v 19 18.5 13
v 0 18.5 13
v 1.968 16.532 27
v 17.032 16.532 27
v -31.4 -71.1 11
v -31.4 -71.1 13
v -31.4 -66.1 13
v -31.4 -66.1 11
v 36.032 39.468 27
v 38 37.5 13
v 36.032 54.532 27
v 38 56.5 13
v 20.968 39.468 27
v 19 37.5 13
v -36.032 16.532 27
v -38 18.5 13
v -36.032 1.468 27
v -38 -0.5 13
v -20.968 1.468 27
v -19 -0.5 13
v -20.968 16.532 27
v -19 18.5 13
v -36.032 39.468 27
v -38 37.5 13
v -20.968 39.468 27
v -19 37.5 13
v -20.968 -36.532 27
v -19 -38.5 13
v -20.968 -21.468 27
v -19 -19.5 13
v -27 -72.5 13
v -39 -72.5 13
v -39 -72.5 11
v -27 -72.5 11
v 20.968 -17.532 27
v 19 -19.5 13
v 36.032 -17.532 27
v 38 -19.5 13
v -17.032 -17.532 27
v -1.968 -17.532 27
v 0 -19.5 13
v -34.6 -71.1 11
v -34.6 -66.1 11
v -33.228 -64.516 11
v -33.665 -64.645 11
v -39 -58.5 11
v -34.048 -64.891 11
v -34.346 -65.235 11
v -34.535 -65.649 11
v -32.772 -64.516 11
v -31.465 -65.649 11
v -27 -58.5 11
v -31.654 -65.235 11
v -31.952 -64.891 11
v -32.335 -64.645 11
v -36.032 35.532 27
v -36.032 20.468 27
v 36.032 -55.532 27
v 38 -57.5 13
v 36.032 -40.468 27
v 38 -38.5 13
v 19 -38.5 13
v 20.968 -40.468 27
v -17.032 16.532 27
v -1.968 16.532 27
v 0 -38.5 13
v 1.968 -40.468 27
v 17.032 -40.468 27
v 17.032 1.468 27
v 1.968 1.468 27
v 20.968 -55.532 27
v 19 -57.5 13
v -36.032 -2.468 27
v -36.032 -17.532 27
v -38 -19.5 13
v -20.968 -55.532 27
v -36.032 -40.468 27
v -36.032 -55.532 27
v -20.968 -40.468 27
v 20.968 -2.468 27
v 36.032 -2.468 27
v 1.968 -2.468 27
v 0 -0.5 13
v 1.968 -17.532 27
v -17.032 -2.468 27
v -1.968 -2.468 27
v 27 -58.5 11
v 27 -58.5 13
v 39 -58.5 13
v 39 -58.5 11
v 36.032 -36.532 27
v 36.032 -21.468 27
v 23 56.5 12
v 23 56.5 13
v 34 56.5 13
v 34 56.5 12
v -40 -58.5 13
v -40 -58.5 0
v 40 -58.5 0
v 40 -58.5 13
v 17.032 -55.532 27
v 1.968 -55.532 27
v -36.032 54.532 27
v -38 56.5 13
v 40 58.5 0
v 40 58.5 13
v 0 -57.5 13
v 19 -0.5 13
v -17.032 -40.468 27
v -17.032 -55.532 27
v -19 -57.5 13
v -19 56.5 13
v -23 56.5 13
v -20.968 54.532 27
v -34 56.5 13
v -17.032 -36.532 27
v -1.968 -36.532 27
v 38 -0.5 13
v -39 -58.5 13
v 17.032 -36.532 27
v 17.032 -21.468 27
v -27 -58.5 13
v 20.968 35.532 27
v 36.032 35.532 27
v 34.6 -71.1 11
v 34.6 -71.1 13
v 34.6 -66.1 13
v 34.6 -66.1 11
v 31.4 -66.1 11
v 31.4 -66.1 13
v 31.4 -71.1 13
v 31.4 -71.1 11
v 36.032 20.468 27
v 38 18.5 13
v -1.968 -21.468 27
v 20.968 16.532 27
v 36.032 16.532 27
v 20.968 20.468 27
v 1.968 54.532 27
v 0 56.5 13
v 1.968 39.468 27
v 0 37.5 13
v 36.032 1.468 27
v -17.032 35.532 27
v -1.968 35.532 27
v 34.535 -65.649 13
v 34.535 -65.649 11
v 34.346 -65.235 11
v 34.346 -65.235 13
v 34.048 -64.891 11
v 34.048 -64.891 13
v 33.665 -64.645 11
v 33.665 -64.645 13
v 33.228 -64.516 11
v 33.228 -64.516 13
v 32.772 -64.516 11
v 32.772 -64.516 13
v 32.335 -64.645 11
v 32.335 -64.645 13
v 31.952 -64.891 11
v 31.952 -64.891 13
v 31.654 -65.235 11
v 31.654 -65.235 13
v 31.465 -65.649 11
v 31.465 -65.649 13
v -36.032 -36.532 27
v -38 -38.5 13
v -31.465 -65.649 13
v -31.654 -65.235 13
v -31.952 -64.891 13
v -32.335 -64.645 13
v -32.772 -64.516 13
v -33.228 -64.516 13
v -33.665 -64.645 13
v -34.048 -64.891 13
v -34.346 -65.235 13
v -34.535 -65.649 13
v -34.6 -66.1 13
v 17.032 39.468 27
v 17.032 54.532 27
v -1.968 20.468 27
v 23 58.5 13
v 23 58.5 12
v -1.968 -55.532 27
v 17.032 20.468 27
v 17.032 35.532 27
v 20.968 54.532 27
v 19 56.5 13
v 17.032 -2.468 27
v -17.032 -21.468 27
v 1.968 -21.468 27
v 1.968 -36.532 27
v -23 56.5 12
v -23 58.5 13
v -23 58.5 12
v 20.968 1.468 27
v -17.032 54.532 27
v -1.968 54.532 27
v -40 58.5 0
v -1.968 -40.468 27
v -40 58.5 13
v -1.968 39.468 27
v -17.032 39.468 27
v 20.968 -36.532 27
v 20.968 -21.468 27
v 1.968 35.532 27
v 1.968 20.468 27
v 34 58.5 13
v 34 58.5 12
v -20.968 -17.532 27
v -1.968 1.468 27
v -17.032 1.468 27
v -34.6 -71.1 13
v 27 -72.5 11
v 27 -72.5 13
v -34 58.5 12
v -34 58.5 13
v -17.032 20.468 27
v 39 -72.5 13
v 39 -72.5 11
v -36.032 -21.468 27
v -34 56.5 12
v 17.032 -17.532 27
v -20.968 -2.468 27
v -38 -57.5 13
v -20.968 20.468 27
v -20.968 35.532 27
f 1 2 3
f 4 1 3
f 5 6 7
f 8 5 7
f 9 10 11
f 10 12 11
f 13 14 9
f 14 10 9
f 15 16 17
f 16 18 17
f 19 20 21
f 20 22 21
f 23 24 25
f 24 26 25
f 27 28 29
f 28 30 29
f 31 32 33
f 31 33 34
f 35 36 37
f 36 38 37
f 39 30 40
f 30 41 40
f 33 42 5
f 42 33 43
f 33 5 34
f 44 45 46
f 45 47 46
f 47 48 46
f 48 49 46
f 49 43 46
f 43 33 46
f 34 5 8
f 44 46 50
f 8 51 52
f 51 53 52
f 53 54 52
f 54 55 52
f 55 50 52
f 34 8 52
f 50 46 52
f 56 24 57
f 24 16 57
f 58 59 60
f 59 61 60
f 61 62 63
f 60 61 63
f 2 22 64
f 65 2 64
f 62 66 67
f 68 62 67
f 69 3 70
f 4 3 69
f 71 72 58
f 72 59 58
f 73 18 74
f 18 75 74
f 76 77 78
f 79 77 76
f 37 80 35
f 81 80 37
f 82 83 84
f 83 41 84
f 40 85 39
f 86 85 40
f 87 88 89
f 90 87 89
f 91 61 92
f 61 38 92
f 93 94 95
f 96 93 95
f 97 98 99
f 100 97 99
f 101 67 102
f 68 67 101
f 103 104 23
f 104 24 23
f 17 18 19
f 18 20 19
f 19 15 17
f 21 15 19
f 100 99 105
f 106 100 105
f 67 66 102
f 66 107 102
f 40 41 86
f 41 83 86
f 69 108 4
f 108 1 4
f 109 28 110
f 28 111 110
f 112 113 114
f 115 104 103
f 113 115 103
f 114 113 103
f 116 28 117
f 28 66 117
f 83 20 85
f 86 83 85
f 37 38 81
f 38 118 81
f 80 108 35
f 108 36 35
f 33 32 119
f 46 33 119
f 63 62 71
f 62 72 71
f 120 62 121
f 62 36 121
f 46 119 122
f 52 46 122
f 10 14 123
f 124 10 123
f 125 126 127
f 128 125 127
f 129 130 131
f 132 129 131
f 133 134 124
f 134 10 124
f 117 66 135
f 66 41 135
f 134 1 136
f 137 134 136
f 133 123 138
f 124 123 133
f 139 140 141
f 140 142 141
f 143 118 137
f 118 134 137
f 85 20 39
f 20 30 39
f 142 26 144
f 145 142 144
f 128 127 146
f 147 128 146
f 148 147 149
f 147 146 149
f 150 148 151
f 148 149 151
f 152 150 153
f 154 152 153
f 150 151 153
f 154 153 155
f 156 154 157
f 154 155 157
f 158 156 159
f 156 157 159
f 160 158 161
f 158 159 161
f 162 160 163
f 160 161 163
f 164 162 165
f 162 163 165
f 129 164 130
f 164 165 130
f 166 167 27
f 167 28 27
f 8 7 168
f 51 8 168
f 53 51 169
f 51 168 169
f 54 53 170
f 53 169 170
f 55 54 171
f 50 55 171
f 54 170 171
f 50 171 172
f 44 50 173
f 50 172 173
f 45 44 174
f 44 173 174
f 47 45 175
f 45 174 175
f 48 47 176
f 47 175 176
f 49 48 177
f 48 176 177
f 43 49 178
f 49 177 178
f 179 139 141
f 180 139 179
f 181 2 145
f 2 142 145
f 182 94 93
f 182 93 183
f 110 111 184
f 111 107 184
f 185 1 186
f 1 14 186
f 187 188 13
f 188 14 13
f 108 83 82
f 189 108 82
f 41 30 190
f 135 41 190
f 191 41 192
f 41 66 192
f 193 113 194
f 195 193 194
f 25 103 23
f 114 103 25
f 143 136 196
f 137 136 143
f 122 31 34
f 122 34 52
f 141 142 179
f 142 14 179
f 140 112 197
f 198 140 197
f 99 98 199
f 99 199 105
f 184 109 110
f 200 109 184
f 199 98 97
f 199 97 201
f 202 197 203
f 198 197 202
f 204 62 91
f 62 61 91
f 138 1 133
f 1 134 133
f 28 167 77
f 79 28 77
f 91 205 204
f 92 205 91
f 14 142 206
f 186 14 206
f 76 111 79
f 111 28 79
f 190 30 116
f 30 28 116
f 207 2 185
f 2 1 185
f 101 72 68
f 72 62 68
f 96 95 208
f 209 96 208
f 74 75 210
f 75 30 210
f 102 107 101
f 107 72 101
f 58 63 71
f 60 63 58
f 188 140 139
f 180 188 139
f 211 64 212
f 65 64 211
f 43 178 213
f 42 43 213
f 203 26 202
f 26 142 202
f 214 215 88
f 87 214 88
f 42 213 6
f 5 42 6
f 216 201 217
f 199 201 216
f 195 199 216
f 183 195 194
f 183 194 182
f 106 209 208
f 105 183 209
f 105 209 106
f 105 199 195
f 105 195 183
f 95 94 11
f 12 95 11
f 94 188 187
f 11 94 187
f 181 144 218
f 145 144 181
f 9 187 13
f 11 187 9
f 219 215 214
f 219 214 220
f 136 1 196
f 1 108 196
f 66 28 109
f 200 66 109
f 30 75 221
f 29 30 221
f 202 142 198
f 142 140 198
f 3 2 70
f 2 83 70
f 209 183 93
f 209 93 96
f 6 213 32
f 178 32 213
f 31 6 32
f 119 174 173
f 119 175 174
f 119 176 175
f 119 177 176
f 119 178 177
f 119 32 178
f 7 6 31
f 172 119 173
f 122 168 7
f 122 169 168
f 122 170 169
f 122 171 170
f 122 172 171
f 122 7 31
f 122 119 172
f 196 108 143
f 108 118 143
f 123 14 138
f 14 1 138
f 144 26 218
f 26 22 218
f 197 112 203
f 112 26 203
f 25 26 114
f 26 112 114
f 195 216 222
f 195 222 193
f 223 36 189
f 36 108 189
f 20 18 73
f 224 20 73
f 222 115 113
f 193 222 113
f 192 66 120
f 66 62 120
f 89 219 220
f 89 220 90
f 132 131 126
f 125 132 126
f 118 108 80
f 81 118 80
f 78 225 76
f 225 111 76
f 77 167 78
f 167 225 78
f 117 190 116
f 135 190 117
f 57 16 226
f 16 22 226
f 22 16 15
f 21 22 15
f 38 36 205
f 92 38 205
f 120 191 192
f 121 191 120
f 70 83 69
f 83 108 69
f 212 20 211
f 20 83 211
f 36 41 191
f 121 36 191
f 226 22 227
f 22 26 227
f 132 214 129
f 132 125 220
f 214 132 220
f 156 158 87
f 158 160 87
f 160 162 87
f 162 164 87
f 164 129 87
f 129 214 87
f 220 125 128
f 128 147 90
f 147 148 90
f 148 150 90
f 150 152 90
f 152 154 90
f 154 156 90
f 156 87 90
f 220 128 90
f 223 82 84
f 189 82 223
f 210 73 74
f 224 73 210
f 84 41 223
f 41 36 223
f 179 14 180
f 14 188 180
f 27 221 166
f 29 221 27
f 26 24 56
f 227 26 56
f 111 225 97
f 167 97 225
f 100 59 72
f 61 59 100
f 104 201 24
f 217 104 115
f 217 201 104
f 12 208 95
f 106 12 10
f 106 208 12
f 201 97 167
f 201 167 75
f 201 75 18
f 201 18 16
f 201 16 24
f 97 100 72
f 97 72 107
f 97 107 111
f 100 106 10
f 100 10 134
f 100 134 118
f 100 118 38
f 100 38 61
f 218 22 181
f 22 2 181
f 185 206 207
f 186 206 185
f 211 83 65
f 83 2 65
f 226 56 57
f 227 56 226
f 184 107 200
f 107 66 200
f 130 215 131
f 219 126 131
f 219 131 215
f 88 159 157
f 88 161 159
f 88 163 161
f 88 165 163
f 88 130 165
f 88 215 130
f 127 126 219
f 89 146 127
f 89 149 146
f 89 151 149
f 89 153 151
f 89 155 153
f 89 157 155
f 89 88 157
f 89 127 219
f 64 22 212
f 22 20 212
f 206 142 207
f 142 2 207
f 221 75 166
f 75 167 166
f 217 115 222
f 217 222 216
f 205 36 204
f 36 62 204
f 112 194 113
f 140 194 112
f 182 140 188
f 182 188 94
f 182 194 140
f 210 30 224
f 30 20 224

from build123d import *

# Parameters (mm, degrees)
SKETCH_1_W                  = 80
SKETCH_1_H                  = 117
EXTRUDE_1_DEPTH             = 13
SKETCH_2_W                  = 19
SKETCH_2_H                  = 19
EXTRUDE_2_DEPTH             = 14
EXTRUDE_2_TAPER             = 8
PATTERN_LINEAR_1_COUNT      = 4
PATTERN_LINEAR_1_PITCH      = 19
PATTERN_LINEAR_1_COUNT_DIR2 = 6
PATTERN_LINEAR_1_PITCH_DIR2 = 19
SKETCH_4_W                  = 12
SKETCH_4_H                  = 14
EXTRUDE_3_DEPTH             = 2
EXTRUDE_3_2_DEPTH           = 2
SKETCH_3_W                  = 11
SKETCH_3_H                  = 2
CUT_EXTRUDE_1_DEPTH         = 1


with BuildPart() as part:
    # Эскиз1 → Бобышка-Вытянуть1 (new body)
    with BuildSketch(Plane.XY):
        Rectangle(SKETCH_1_W, SKETCH_1_H)
    extrude(amount=EXTRUDE_1_DEPTH)

    # Эскиз2 → Бобышка-Вытянуть2 (add)
    with BuildSketch(Plane.XY.offset(13)):
        with Locations((-28.5, 47)):
            Rectangle(SKETCH_2_W, SKETCH_2_H)
    extrude_2 = extrude(amount=EXTRUDE_2_DEPTH, taper=EXTRUDE_2_TAPER)

    # Линейный массив1: Extrude 2 4 × 6
    with Locations(*[(i * PATTERN_LINEAR_1_PITCH, -j * PATTERN_LINEAR_1_PITCH_DIR2, 0) for i in range(PATTERN_LINEAR_1_COUNT) for j in range(PATTERN_LINEAR_1_COUNT_DIR2) if (i, j) != (0, 0)]):
        add(extrude_2)

    # Эскиз3 → Вырез-Вытянуть1 (cut)
    with BuildSketch(Plane.XY.offset(13)):
        with Locations((-28.5, 57.5)):
            Rectangle(SKETCH_3_W, SKETCH_3_H)
        with Locations((28.5, 57.5)):
            Rectangle(SKETCH_3_W, SKETCH_3_H)
    extrude(amount=-CUT_EXTRUDE_1_DEPTH, mode=Mode.SUBTRACT)


with BuildPart() as body_2:
    # Эскиз4 → Бобышка-Вытянуть3 (new body)
    with BuildSketch(Plane.XY.offset(13)):
        with Locations((-33, -65.5)):
            Rectangle(SKETCH_4_W, SKETCH_4_H)
        with BuildLine():
            Line((-34.6, -66.1), (-34.6, -71.1))
            Line((-34.6, -71.1), (-31.4, -71.1))
            Line((-31.4, -71.1), (-31.4, -66.1))
            ThreePointArc((-31.4, -66.1), (-33, -64.5), (-34.6, -66.1))
        make_face(mode=Mode.SUBTRACT)
    extrude(amount=-EXTRUDE_3_DEPTH)


with BuildPart() as body_3:
    # Эскиз4 → Extrude 3 2 (new body)
    with BuildSketch(Plane.XY.offset(13)):
        with Locations((33, -65.5)):
            Rectangle(SKETCH_4_W, SKETCH_4_H)
        with BuildLine():
            Line((31.4, -66.1), (31.4, -71.1))
            Line((31.4, -71.1), (34.6, -71.1))
            Line((34.6, -71.1), (34.6, -66.1))
            ThreePointArc((34.6, -66.1), (33, -64.5), (31.4, -66.1))
        make_face(mode=Mode.SUBTRACT)
    extrude(amount=-EXTRUDE_3_2_DEPTH)


solid = Compound([part.part, body_2.part, body_3.part])
